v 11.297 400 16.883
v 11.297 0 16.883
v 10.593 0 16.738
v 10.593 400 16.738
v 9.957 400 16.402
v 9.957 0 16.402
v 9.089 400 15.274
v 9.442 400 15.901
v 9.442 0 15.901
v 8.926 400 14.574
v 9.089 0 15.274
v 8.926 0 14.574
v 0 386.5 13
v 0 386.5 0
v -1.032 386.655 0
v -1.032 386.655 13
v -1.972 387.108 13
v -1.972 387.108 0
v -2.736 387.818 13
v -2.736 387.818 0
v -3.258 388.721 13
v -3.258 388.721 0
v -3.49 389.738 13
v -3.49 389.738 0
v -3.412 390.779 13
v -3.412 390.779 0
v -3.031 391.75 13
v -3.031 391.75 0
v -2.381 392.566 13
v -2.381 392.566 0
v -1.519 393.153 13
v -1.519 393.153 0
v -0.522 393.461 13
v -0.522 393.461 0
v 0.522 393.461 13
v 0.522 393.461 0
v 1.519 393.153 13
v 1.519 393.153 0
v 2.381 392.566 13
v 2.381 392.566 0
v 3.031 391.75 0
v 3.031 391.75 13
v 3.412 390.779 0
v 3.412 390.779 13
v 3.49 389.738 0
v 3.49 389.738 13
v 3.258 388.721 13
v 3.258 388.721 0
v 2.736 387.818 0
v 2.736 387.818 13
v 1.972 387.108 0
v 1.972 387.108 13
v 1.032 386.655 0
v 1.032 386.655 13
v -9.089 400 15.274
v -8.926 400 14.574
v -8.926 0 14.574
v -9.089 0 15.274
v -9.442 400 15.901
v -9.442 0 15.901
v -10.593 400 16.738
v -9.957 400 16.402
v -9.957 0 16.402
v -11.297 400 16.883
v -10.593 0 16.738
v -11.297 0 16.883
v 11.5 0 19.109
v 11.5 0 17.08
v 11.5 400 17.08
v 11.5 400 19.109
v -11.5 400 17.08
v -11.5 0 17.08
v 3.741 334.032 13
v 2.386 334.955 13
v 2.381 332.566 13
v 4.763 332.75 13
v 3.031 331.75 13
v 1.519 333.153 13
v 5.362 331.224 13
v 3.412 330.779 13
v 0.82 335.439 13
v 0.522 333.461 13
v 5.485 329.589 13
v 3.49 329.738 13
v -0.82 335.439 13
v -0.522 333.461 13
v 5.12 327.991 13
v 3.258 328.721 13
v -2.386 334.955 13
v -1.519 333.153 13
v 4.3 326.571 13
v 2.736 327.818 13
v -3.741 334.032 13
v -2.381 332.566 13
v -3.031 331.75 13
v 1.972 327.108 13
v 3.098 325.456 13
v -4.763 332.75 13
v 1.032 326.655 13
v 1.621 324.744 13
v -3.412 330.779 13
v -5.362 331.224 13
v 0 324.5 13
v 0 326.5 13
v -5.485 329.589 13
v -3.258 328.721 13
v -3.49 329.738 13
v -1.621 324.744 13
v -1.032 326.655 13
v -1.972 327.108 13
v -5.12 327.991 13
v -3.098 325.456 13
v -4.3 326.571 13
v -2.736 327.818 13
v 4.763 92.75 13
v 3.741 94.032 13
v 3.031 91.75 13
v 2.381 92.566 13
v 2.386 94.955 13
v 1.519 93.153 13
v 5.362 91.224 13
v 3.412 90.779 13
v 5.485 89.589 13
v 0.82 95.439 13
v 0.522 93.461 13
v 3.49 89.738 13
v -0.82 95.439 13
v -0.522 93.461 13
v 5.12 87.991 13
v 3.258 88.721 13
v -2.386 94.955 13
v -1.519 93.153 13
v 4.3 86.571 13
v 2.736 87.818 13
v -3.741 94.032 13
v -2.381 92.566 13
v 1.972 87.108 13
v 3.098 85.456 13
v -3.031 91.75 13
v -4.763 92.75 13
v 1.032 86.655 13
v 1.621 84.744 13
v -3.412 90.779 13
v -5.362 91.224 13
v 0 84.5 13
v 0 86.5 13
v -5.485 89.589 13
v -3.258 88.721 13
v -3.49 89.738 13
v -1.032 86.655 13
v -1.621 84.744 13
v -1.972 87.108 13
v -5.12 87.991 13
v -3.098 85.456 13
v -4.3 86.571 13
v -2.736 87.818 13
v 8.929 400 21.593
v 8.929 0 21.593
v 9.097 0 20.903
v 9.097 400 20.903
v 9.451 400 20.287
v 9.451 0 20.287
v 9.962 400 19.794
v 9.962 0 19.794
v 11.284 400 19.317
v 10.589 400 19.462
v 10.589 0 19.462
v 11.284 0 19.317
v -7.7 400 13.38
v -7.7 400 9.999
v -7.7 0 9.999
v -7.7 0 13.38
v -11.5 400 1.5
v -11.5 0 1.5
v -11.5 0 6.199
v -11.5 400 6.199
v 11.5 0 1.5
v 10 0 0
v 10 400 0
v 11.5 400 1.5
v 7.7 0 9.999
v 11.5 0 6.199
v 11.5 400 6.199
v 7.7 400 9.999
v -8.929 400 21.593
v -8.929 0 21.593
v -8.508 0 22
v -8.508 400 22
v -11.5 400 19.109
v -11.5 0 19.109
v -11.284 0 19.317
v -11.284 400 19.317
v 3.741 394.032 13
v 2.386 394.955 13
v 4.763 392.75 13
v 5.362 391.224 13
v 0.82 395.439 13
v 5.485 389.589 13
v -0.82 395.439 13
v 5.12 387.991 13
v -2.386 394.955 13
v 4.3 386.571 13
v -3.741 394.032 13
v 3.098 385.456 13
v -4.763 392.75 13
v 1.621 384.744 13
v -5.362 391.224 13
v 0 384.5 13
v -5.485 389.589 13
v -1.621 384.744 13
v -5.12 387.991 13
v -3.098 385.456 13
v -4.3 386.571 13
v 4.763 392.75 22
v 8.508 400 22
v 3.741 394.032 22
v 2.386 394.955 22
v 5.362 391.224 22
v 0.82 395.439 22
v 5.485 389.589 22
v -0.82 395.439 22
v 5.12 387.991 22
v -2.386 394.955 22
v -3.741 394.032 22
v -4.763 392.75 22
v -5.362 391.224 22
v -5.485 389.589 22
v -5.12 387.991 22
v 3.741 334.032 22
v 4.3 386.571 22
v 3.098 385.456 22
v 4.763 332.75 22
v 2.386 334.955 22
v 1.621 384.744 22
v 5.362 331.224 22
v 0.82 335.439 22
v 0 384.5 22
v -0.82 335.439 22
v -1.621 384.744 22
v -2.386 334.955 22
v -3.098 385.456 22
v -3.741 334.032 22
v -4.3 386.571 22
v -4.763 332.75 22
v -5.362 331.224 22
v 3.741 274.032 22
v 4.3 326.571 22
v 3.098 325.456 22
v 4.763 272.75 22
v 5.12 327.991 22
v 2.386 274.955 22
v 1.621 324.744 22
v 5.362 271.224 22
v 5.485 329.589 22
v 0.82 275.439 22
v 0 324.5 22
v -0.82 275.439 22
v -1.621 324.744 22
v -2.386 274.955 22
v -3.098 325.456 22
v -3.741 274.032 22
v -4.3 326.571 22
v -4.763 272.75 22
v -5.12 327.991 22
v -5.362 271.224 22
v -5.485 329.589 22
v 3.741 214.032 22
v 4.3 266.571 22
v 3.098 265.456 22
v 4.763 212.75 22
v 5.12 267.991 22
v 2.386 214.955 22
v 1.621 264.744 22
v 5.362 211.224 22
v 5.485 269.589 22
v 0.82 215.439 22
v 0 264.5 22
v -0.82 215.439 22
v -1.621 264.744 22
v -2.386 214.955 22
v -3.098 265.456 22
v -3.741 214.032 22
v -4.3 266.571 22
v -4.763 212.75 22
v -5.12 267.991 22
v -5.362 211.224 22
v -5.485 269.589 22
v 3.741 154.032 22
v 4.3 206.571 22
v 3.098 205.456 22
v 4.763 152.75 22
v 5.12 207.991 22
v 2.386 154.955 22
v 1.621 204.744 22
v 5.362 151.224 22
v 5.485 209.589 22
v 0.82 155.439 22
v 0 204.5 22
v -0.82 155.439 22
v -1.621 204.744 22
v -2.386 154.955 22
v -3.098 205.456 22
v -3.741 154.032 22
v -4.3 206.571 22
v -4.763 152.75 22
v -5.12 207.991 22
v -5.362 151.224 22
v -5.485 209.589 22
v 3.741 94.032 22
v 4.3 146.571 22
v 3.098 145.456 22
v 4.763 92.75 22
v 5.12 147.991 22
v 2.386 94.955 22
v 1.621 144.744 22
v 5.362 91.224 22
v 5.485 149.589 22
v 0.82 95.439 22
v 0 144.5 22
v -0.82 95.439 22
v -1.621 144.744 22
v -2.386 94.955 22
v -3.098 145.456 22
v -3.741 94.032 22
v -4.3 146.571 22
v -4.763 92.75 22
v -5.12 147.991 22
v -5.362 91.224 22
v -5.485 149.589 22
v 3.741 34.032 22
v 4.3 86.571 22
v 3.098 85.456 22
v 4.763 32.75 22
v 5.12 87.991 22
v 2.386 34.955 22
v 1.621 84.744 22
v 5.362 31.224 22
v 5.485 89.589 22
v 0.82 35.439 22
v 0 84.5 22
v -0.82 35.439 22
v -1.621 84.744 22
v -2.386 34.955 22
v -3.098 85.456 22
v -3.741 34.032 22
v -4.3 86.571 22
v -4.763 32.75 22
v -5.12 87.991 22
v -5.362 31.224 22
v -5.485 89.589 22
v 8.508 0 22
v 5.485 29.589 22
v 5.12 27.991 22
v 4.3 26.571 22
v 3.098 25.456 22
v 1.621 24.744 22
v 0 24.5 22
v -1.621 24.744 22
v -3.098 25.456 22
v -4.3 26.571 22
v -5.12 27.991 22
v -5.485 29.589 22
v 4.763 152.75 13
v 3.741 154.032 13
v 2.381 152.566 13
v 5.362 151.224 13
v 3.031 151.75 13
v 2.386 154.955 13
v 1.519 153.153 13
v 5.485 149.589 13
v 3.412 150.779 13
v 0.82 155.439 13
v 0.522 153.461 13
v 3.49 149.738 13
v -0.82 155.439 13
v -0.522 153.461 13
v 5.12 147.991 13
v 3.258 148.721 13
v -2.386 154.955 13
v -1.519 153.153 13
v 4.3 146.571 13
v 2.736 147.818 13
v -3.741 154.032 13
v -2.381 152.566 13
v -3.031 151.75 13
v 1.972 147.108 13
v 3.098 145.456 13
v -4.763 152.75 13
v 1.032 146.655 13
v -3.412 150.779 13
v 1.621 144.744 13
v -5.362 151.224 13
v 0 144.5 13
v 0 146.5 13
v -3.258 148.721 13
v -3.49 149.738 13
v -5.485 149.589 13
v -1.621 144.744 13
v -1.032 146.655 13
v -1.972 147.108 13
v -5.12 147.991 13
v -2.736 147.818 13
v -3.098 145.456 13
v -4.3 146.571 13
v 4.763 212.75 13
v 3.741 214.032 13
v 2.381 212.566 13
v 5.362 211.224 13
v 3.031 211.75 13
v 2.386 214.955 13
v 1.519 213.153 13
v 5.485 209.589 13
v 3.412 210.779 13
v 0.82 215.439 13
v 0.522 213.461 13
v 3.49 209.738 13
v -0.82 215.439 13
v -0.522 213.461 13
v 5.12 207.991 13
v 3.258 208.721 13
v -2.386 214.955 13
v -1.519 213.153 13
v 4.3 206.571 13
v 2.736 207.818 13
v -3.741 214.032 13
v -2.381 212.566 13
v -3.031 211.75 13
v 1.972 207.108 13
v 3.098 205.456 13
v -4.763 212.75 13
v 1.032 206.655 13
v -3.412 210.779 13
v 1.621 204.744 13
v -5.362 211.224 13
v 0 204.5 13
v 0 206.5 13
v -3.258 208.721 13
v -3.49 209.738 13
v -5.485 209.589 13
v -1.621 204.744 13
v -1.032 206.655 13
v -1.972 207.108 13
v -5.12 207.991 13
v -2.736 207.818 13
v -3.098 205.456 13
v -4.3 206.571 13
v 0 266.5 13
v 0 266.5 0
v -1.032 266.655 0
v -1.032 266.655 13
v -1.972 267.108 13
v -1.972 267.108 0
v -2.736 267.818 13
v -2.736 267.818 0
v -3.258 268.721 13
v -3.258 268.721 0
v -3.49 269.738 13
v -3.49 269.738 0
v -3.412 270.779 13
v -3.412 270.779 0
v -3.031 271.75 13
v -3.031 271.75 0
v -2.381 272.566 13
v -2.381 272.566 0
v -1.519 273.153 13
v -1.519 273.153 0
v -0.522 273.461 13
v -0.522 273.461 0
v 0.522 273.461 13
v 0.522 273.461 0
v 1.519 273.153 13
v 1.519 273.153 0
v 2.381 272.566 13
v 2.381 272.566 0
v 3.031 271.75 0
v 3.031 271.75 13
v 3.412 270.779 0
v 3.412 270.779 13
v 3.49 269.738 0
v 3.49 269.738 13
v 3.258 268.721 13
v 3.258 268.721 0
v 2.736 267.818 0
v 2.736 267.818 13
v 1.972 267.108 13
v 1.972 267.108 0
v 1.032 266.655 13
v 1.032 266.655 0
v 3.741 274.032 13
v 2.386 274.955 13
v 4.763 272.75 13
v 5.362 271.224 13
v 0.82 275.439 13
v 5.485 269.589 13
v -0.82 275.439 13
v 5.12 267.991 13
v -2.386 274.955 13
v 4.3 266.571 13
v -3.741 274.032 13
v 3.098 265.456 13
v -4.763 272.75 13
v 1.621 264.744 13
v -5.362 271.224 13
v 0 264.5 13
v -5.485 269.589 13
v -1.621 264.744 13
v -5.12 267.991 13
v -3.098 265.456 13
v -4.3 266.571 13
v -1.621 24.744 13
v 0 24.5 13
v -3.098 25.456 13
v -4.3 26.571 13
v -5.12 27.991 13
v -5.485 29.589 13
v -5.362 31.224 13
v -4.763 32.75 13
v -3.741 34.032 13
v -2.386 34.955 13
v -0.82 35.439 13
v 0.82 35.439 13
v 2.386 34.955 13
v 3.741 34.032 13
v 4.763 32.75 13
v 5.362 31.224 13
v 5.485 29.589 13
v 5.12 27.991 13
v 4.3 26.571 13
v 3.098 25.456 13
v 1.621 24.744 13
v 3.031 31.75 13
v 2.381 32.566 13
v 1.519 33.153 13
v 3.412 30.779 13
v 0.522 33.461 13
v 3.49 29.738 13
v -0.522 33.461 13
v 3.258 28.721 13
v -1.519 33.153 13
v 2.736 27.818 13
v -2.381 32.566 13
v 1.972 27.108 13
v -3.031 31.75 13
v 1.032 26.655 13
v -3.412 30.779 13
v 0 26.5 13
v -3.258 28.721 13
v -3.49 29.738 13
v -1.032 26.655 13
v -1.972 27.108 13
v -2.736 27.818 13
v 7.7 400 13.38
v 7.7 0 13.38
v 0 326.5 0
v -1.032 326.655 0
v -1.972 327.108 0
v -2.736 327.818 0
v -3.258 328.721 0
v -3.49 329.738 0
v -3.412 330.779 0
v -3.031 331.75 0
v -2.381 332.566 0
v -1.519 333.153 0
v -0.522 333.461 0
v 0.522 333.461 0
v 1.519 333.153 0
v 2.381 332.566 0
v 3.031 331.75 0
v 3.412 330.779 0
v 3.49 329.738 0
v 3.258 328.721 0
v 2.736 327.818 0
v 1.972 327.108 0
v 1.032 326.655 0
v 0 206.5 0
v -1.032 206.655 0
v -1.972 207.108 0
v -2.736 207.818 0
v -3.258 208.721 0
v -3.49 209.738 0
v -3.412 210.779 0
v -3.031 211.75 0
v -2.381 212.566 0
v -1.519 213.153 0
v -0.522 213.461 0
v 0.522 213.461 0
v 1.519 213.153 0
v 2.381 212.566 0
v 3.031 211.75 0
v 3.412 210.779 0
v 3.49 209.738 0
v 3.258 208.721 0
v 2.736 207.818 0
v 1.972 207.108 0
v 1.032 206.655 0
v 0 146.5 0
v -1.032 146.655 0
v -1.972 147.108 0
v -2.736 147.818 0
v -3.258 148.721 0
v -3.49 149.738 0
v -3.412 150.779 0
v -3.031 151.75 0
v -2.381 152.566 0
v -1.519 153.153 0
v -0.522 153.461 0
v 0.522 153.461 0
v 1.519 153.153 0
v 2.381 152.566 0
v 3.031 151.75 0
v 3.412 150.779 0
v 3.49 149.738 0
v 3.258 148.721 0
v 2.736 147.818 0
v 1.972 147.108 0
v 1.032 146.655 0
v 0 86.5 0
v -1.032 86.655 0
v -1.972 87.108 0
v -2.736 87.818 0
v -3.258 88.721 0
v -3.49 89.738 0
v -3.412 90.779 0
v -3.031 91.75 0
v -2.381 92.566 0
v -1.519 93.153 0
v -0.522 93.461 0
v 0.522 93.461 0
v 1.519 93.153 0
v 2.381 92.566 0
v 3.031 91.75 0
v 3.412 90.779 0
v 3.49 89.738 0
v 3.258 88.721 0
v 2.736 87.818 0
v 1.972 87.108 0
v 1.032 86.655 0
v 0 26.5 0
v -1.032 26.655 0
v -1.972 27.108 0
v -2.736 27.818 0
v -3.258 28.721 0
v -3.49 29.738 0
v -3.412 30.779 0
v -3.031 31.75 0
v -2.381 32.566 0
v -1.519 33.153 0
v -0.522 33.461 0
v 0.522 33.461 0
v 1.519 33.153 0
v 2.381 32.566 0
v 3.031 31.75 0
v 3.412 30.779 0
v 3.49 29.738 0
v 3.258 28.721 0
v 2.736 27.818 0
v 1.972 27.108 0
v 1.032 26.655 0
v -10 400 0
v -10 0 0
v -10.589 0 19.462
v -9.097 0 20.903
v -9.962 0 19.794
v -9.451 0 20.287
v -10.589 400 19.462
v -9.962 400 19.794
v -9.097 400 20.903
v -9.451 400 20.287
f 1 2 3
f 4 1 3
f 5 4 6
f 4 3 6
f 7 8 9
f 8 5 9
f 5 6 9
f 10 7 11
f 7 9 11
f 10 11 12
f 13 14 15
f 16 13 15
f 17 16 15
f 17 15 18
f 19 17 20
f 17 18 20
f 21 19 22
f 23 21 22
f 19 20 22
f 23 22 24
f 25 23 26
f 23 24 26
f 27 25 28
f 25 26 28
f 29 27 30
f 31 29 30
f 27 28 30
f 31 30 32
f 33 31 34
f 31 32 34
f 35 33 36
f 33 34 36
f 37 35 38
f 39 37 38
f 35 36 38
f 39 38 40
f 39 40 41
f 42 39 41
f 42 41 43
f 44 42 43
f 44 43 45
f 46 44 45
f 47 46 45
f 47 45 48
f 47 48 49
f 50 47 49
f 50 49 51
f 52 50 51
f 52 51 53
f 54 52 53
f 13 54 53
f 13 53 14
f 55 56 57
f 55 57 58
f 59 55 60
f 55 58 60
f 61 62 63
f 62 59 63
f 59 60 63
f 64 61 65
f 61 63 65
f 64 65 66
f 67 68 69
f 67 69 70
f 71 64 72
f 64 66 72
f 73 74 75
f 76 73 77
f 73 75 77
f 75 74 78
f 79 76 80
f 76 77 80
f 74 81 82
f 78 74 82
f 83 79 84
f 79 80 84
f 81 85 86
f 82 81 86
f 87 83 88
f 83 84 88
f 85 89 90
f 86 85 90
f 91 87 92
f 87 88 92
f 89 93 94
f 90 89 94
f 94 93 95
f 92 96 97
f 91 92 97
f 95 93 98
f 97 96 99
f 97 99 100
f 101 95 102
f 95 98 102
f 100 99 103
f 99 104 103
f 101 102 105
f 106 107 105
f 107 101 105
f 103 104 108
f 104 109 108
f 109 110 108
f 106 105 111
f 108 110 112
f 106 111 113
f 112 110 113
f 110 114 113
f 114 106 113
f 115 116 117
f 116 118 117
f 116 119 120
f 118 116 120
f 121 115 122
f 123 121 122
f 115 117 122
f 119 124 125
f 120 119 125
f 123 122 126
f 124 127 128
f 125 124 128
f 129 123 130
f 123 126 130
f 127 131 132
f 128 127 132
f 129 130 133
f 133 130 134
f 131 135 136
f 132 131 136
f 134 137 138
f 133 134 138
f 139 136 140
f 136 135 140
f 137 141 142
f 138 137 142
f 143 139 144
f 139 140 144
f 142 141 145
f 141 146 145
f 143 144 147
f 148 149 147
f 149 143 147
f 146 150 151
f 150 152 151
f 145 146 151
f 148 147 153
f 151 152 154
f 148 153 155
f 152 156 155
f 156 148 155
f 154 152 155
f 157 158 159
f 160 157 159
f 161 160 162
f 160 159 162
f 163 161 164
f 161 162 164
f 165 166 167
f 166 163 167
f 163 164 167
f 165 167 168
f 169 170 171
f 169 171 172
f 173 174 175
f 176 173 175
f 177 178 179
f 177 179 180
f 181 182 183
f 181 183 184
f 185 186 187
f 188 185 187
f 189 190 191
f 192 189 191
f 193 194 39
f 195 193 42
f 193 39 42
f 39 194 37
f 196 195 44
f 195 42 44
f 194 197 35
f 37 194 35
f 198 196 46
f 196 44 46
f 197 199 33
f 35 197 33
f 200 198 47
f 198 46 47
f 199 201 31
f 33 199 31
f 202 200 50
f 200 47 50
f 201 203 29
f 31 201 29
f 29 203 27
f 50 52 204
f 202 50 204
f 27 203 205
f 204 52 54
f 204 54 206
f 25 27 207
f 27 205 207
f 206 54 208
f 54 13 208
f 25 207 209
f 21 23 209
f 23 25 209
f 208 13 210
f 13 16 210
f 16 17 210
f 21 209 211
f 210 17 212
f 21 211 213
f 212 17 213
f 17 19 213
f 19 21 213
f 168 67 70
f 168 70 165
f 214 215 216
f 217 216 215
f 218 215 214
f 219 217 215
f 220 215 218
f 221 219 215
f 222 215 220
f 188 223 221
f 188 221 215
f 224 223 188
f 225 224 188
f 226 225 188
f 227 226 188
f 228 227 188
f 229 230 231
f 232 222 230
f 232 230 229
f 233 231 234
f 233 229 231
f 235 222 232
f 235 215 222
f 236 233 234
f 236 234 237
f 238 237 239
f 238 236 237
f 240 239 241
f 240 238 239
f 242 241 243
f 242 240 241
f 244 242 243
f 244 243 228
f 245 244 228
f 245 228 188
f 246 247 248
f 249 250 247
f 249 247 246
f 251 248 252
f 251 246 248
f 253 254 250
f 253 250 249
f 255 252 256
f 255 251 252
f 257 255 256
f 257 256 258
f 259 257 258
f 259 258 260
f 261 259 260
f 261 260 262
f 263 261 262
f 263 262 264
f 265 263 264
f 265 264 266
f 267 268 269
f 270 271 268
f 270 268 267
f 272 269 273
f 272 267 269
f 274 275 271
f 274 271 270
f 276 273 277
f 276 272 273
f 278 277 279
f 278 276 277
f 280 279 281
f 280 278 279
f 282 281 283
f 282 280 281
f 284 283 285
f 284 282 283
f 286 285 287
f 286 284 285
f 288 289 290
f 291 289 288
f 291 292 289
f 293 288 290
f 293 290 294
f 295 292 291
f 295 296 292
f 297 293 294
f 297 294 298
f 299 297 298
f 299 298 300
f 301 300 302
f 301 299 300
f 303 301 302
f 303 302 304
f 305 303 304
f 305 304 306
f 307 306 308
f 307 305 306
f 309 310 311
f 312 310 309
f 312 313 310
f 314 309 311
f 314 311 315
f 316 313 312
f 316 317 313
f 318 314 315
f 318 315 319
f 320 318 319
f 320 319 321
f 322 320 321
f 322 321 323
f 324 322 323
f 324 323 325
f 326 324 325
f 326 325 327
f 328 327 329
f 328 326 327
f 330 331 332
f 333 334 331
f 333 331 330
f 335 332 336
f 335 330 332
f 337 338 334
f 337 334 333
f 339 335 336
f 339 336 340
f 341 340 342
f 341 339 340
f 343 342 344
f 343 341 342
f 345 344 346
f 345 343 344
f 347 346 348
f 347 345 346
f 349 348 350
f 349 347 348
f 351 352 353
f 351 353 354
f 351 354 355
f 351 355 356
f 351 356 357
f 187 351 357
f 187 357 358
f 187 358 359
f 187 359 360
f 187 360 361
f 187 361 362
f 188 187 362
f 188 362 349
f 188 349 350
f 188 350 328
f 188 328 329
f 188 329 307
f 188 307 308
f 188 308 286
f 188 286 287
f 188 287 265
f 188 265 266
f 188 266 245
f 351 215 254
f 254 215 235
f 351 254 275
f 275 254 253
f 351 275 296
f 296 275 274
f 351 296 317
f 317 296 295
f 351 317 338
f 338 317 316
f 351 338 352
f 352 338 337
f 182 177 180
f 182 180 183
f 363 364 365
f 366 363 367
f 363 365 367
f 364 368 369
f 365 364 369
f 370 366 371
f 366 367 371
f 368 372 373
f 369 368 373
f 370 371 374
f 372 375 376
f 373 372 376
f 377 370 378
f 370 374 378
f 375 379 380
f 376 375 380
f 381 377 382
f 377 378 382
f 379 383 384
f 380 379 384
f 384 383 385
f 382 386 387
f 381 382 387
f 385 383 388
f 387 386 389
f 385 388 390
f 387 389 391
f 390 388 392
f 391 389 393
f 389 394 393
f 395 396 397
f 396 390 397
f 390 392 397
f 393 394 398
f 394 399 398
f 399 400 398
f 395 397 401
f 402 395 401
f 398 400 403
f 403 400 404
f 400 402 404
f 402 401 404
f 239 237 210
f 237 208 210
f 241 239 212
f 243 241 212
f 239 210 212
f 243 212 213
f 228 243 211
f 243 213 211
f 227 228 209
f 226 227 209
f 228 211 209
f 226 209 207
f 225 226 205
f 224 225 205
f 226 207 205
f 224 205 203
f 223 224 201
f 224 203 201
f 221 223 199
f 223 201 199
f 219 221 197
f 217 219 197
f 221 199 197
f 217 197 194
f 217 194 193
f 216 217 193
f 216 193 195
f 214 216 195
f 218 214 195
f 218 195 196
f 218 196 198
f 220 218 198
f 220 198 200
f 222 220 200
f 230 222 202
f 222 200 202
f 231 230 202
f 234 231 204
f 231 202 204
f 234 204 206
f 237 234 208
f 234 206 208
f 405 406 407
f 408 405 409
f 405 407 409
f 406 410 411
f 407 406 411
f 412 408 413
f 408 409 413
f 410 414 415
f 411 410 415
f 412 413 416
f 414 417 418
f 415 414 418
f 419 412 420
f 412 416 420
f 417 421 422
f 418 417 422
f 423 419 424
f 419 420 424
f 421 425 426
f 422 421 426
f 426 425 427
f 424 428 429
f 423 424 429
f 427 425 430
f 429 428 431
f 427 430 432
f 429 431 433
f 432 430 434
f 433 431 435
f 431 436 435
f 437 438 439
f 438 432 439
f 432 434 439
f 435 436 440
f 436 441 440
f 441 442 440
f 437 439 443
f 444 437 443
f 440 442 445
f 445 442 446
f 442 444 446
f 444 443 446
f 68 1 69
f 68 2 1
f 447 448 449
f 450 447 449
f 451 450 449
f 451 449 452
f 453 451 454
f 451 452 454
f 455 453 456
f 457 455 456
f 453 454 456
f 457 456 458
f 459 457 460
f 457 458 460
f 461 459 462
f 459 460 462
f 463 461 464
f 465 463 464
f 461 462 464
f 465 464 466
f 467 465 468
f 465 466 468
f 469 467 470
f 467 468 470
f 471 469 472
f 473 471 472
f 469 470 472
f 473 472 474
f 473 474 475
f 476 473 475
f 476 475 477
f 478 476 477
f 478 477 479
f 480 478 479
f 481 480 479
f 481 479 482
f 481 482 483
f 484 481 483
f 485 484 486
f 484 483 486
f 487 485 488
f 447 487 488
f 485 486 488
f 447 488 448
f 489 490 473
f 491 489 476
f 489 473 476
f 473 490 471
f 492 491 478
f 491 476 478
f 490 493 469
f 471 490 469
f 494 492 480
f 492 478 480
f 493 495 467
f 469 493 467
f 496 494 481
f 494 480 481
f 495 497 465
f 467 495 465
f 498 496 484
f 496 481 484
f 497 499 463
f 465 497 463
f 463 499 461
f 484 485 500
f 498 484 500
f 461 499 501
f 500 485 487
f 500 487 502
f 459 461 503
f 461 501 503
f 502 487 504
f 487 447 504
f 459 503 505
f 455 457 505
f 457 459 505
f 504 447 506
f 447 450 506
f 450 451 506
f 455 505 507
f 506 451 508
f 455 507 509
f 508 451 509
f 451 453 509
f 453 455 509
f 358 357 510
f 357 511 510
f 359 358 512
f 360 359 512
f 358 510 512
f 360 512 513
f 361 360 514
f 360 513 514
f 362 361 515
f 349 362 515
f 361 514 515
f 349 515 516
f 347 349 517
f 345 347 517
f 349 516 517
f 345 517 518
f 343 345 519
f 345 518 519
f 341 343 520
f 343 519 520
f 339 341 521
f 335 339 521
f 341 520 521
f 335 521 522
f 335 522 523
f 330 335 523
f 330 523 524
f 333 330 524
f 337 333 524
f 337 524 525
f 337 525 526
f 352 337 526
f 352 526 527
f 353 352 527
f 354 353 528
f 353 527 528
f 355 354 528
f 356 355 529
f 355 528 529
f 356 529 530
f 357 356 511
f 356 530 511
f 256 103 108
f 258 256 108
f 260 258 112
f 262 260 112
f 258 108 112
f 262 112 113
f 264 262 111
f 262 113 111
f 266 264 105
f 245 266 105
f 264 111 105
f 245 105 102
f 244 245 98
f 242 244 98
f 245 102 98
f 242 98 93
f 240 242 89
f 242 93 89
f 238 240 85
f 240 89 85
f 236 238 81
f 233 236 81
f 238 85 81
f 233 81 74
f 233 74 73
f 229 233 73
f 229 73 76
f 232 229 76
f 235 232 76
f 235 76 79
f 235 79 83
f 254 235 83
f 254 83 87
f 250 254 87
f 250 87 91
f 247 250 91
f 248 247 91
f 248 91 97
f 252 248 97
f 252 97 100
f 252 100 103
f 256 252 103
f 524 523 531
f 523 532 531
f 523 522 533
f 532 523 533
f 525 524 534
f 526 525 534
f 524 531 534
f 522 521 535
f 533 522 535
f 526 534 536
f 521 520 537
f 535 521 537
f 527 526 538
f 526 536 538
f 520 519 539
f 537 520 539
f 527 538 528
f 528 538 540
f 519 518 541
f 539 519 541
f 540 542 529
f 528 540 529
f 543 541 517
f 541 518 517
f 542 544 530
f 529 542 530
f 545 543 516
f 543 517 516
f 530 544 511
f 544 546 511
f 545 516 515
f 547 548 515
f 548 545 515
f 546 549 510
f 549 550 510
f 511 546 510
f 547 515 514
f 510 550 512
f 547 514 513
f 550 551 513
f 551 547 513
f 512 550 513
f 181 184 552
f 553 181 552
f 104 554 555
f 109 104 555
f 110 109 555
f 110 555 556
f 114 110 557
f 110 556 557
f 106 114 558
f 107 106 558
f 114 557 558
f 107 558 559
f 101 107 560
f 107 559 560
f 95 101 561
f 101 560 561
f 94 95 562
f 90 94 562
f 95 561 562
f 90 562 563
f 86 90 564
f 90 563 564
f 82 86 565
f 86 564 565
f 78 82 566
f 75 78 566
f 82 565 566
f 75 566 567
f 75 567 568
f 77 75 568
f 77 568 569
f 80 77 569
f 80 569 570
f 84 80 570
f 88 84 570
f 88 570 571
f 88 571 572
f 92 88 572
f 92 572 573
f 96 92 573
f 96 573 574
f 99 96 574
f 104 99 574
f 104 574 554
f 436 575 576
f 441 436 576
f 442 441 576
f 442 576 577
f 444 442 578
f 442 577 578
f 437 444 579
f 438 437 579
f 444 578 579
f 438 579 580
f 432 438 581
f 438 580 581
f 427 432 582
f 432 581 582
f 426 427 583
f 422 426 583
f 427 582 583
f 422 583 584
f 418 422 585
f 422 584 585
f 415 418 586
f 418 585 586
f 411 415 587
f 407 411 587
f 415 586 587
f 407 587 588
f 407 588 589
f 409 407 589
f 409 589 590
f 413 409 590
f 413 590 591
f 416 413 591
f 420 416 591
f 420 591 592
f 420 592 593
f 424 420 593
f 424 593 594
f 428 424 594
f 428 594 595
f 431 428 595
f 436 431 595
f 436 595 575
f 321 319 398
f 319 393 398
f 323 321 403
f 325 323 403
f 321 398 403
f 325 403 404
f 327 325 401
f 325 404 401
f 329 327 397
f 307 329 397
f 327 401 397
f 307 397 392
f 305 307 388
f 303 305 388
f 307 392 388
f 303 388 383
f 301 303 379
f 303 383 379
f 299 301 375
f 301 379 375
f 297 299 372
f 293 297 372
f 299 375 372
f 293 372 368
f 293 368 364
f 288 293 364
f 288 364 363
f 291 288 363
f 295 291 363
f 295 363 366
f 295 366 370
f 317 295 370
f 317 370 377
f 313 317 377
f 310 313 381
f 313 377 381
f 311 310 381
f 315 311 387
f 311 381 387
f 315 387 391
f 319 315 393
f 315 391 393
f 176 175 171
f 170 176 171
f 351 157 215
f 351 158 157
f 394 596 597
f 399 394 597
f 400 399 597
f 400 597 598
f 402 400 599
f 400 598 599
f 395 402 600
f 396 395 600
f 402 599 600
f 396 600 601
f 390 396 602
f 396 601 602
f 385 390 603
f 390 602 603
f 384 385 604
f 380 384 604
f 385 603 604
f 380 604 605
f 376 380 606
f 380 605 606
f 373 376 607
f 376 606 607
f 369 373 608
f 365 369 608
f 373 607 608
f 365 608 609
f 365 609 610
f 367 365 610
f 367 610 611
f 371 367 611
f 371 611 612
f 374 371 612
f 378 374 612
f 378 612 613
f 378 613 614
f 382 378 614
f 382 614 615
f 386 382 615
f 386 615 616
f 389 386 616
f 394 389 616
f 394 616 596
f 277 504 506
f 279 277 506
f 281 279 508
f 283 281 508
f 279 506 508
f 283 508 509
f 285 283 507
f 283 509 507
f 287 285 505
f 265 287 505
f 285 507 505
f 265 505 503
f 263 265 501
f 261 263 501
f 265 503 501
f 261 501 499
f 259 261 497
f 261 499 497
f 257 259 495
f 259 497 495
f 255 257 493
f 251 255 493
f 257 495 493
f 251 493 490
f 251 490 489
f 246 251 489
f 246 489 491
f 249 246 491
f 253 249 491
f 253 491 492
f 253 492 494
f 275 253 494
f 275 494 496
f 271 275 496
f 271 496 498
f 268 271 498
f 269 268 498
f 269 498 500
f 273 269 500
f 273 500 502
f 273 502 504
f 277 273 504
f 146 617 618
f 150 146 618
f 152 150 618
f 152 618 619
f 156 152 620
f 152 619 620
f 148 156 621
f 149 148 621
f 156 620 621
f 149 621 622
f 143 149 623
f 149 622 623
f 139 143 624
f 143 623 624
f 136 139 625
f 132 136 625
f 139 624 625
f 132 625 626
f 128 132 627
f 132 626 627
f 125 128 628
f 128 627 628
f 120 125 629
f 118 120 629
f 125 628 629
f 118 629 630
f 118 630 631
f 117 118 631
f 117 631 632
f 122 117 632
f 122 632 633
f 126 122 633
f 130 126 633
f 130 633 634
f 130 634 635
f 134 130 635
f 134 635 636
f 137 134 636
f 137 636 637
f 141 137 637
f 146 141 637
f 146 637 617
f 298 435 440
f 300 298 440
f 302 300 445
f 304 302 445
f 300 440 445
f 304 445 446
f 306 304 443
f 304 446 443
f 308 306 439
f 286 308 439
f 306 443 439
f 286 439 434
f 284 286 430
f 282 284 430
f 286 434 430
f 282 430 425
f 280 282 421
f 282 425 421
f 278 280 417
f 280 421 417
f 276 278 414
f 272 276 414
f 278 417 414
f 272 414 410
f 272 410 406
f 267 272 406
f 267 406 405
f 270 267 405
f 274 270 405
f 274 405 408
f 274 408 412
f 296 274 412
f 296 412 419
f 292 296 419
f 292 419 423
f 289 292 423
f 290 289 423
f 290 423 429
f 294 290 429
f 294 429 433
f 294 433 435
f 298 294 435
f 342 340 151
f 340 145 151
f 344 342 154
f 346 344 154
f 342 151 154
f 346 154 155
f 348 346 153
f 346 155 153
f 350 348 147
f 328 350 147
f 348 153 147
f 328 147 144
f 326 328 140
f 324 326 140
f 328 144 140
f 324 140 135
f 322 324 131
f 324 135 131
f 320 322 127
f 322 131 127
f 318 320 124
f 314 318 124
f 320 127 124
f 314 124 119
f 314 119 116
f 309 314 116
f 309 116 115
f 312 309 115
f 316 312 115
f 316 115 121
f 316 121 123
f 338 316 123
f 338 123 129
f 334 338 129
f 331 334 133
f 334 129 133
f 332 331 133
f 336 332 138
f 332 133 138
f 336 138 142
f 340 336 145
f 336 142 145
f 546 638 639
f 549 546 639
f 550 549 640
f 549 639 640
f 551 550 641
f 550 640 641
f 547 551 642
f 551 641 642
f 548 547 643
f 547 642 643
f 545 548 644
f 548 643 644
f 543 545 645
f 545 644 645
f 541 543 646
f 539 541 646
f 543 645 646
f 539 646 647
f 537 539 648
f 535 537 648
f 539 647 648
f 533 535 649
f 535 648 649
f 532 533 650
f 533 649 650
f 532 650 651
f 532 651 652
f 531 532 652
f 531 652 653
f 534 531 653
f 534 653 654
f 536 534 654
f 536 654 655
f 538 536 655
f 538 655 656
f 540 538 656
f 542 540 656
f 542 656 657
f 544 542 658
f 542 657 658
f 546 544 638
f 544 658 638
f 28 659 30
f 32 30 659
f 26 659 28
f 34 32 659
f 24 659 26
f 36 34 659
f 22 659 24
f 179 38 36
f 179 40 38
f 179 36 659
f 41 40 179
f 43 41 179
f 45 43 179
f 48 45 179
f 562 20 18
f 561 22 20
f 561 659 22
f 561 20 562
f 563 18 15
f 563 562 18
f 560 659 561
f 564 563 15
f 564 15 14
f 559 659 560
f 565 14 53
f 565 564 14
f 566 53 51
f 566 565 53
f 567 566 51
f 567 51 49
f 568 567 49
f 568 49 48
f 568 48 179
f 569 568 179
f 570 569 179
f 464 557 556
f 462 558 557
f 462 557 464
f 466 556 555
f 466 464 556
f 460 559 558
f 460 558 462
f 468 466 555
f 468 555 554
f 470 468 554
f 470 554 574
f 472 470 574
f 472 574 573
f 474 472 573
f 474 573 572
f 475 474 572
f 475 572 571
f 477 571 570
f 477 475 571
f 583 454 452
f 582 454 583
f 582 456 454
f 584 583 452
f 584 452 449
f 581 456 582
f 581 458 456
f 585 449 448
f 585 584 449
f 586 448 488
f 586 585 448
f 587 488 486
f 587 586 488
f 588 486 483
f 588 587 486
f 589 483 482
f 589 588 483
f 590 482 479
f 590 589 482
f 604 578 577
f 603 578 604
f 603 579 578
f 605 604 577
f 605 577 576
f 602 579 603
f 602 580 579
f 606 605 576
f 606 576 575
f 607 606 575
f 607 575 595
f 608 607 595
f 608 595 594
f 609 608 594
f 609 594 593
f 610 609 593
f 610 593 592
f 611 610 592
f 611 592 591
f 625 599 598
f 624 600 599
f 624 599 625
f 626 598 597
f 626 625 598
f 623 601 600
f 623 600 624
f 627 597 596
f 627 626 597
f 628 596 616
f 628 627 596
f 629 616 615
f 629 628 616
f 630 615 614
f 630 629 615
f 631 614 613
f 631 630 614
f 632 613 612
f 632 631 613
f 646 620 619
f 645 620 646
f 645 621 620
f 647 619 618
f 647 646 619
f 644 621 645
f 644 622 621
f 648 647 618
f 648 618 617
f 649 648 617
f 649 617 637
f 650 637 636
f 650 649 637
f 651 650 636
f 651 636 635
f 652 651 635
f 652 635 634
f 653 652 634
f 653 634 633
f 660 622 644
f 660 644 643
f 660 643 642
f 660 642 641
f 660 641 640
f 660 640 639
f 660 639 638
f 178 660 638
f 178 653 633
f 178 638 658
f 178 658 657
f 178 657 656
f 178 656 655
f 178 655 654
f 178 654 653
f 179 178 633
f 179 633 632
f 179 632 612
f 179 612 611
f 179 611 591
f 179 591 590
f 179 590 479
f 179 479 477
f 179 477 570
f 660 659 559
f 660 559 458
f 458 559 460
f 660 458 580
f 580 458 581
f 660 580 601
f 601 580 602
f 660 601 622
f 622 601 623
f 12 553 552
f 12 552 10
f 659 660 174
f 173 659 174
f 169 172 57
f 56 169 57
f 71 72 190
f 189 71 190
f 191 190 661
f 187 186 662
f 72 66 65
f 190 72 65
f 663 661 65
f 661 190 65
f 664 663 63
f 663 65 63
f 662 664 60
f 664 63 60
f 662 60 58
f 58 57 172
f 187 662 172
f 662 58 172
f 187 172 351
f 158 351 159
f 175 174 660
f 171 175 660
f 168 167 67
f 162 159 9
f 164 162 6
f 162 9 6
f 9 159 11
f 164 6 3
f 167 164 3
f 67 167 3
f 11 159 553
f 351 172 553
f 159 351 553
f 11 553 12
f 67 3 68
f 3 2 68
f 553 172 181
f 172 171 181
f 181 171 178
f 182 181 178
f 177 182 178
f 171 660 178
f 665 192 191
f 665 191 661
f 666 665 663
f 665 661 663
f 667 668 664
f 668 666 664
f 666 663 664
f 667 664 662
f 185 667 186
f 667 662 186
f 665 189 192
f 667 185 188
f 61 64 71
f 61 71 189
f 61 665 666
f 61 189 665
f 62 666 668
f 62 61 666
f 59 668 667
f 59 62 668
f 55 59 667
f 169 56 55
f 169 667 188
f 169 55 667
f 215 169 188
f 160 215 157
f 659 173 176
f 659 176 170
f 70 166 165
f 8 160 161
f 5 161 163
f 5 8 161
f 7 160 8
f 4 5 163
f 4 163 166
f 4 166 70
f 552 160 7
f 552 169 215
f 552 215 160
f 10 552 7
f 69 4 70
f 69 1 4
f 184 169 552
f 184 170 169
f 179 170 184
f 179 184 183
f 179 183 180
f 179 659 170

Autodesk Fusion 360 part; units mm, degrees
sketch "Sketch2" plane through (0, 0, 0) normal (0, 1, 0) x (1, 0, 0)
  line L0 (0, 0) -> (-10, 0)
  line L1 (-10, 0) -> (-11.5, -1.5)
  line L2 (-11.5, -1.5) -> (-11.5, -6.199)
  line L3 (-11.5, -6.199) -> (-7.7, -9.999)
  line L4 (-7.7, -9.999) -> (-7.7, -13.38)
  line L5 (-11.5, -17.08) -> (-11.5, -19.109)
  line L6 (-8.5085, -22) -> (0, -22)
  line L7 (0, -37) -> (0, 7) construction
  arc A0 (-8.9292, -21.5934) -> (-11.2845, -19.3172) centre (-11.447, -21.842) ccw
  line L8 (-11.5, -19.109) -> (-11.2845, -19.3172)
  line L9 (-8.9292, -21.5934) -> (-8.5085, -22)
  arc A1 (-11.2972, -16.8826) -> (-8.9263, -14.5741) centre (-11.447, -14.357) ccw
  line L10 (-7.7, -13.38) -> (-8.9263, -14.5741)
  line L11 (-11.2972, -16.8826) -> (-11.5, -17.08)
  line L12 (0, 0) -> (10, 0)
  line L13 (10, 0) -> (11.5, -1.5)
  line L14 (11.5, -1.5) -> (11.5, -6.199)
  line L15 (11.5, -6.199) -> (7.7, -9.999)
  line L16 (7.7, -9.999) -> (7.7, -13.38)
  line L17 (7.7, -13.38) -> (8.9263, -14.5741)
  arc A2 (8.9263, -14.5741) -> (11.2972, -16.8826) centre (11.447, -14.357) ccw
  line L18 (11.2972, -16.8826) -> (11.5, -17.08)
  line L19 (11.5, -17.08) -> (11.5, -19.109)
  line L20 (11.5, -19.109) -> (11.2845, -19.3172)
  arc A3 (11.2845, -19.3172) -> (8.9292, -21.5934) centre (11.447, -21.842) ccw
  line L21 (8.9292, -21.5934) -> (8.5085, -22)
  line L22 (8.5085, -22) -> (0, -22)
  dimension "d29" = 10
  dimension "d30" = 1.5
  dimension "d31" = 1.5
  dimension "d32" = 3.381
  dimension "d33" = 3.7
  dimension "d34" = 22
  dimension "d35" = 3.8
  dimension "d36" = 3.8
  dimension "d38" = 8.5085
  dimension "d39" = 2.029
  dimension "d40" = 2.891
  dimension "d42" = 11.447
  dimension "d43" = 0.158
  dimension "d46" = 2.53
  dimension "d47" = 2.53
  dimension "d48" = 7.485
extrude "Extrude2" add sketch "Sketch2" along normal blind 400
hole "Hole4" at (0, 30, 22) direction (0, 0, -1) diameter 7 end up to surface (22 mm away) counterbore diameter 11 counterbore depth 9
pattern_linear "R-Pattern4" count 7 spacing 60 along (0, 1, 0) of "Hole4"
equation "RailLength = 400 mm"
equation "RailHoleSpacing = 60 mm"
equation "RailFirstHoleOffset = ( RailLength - ( ( RailNumberOfHoles - 1 ) * RailHoleSpacing ) ) / 2"
equation "d53 = RailLength"
equation "RailNumberOfHoles = round(RailLength / RailHoleSpacing)"
equation "d94 = RailNumberOfHoles"
equation "d96 = RailHoleSpacing"
